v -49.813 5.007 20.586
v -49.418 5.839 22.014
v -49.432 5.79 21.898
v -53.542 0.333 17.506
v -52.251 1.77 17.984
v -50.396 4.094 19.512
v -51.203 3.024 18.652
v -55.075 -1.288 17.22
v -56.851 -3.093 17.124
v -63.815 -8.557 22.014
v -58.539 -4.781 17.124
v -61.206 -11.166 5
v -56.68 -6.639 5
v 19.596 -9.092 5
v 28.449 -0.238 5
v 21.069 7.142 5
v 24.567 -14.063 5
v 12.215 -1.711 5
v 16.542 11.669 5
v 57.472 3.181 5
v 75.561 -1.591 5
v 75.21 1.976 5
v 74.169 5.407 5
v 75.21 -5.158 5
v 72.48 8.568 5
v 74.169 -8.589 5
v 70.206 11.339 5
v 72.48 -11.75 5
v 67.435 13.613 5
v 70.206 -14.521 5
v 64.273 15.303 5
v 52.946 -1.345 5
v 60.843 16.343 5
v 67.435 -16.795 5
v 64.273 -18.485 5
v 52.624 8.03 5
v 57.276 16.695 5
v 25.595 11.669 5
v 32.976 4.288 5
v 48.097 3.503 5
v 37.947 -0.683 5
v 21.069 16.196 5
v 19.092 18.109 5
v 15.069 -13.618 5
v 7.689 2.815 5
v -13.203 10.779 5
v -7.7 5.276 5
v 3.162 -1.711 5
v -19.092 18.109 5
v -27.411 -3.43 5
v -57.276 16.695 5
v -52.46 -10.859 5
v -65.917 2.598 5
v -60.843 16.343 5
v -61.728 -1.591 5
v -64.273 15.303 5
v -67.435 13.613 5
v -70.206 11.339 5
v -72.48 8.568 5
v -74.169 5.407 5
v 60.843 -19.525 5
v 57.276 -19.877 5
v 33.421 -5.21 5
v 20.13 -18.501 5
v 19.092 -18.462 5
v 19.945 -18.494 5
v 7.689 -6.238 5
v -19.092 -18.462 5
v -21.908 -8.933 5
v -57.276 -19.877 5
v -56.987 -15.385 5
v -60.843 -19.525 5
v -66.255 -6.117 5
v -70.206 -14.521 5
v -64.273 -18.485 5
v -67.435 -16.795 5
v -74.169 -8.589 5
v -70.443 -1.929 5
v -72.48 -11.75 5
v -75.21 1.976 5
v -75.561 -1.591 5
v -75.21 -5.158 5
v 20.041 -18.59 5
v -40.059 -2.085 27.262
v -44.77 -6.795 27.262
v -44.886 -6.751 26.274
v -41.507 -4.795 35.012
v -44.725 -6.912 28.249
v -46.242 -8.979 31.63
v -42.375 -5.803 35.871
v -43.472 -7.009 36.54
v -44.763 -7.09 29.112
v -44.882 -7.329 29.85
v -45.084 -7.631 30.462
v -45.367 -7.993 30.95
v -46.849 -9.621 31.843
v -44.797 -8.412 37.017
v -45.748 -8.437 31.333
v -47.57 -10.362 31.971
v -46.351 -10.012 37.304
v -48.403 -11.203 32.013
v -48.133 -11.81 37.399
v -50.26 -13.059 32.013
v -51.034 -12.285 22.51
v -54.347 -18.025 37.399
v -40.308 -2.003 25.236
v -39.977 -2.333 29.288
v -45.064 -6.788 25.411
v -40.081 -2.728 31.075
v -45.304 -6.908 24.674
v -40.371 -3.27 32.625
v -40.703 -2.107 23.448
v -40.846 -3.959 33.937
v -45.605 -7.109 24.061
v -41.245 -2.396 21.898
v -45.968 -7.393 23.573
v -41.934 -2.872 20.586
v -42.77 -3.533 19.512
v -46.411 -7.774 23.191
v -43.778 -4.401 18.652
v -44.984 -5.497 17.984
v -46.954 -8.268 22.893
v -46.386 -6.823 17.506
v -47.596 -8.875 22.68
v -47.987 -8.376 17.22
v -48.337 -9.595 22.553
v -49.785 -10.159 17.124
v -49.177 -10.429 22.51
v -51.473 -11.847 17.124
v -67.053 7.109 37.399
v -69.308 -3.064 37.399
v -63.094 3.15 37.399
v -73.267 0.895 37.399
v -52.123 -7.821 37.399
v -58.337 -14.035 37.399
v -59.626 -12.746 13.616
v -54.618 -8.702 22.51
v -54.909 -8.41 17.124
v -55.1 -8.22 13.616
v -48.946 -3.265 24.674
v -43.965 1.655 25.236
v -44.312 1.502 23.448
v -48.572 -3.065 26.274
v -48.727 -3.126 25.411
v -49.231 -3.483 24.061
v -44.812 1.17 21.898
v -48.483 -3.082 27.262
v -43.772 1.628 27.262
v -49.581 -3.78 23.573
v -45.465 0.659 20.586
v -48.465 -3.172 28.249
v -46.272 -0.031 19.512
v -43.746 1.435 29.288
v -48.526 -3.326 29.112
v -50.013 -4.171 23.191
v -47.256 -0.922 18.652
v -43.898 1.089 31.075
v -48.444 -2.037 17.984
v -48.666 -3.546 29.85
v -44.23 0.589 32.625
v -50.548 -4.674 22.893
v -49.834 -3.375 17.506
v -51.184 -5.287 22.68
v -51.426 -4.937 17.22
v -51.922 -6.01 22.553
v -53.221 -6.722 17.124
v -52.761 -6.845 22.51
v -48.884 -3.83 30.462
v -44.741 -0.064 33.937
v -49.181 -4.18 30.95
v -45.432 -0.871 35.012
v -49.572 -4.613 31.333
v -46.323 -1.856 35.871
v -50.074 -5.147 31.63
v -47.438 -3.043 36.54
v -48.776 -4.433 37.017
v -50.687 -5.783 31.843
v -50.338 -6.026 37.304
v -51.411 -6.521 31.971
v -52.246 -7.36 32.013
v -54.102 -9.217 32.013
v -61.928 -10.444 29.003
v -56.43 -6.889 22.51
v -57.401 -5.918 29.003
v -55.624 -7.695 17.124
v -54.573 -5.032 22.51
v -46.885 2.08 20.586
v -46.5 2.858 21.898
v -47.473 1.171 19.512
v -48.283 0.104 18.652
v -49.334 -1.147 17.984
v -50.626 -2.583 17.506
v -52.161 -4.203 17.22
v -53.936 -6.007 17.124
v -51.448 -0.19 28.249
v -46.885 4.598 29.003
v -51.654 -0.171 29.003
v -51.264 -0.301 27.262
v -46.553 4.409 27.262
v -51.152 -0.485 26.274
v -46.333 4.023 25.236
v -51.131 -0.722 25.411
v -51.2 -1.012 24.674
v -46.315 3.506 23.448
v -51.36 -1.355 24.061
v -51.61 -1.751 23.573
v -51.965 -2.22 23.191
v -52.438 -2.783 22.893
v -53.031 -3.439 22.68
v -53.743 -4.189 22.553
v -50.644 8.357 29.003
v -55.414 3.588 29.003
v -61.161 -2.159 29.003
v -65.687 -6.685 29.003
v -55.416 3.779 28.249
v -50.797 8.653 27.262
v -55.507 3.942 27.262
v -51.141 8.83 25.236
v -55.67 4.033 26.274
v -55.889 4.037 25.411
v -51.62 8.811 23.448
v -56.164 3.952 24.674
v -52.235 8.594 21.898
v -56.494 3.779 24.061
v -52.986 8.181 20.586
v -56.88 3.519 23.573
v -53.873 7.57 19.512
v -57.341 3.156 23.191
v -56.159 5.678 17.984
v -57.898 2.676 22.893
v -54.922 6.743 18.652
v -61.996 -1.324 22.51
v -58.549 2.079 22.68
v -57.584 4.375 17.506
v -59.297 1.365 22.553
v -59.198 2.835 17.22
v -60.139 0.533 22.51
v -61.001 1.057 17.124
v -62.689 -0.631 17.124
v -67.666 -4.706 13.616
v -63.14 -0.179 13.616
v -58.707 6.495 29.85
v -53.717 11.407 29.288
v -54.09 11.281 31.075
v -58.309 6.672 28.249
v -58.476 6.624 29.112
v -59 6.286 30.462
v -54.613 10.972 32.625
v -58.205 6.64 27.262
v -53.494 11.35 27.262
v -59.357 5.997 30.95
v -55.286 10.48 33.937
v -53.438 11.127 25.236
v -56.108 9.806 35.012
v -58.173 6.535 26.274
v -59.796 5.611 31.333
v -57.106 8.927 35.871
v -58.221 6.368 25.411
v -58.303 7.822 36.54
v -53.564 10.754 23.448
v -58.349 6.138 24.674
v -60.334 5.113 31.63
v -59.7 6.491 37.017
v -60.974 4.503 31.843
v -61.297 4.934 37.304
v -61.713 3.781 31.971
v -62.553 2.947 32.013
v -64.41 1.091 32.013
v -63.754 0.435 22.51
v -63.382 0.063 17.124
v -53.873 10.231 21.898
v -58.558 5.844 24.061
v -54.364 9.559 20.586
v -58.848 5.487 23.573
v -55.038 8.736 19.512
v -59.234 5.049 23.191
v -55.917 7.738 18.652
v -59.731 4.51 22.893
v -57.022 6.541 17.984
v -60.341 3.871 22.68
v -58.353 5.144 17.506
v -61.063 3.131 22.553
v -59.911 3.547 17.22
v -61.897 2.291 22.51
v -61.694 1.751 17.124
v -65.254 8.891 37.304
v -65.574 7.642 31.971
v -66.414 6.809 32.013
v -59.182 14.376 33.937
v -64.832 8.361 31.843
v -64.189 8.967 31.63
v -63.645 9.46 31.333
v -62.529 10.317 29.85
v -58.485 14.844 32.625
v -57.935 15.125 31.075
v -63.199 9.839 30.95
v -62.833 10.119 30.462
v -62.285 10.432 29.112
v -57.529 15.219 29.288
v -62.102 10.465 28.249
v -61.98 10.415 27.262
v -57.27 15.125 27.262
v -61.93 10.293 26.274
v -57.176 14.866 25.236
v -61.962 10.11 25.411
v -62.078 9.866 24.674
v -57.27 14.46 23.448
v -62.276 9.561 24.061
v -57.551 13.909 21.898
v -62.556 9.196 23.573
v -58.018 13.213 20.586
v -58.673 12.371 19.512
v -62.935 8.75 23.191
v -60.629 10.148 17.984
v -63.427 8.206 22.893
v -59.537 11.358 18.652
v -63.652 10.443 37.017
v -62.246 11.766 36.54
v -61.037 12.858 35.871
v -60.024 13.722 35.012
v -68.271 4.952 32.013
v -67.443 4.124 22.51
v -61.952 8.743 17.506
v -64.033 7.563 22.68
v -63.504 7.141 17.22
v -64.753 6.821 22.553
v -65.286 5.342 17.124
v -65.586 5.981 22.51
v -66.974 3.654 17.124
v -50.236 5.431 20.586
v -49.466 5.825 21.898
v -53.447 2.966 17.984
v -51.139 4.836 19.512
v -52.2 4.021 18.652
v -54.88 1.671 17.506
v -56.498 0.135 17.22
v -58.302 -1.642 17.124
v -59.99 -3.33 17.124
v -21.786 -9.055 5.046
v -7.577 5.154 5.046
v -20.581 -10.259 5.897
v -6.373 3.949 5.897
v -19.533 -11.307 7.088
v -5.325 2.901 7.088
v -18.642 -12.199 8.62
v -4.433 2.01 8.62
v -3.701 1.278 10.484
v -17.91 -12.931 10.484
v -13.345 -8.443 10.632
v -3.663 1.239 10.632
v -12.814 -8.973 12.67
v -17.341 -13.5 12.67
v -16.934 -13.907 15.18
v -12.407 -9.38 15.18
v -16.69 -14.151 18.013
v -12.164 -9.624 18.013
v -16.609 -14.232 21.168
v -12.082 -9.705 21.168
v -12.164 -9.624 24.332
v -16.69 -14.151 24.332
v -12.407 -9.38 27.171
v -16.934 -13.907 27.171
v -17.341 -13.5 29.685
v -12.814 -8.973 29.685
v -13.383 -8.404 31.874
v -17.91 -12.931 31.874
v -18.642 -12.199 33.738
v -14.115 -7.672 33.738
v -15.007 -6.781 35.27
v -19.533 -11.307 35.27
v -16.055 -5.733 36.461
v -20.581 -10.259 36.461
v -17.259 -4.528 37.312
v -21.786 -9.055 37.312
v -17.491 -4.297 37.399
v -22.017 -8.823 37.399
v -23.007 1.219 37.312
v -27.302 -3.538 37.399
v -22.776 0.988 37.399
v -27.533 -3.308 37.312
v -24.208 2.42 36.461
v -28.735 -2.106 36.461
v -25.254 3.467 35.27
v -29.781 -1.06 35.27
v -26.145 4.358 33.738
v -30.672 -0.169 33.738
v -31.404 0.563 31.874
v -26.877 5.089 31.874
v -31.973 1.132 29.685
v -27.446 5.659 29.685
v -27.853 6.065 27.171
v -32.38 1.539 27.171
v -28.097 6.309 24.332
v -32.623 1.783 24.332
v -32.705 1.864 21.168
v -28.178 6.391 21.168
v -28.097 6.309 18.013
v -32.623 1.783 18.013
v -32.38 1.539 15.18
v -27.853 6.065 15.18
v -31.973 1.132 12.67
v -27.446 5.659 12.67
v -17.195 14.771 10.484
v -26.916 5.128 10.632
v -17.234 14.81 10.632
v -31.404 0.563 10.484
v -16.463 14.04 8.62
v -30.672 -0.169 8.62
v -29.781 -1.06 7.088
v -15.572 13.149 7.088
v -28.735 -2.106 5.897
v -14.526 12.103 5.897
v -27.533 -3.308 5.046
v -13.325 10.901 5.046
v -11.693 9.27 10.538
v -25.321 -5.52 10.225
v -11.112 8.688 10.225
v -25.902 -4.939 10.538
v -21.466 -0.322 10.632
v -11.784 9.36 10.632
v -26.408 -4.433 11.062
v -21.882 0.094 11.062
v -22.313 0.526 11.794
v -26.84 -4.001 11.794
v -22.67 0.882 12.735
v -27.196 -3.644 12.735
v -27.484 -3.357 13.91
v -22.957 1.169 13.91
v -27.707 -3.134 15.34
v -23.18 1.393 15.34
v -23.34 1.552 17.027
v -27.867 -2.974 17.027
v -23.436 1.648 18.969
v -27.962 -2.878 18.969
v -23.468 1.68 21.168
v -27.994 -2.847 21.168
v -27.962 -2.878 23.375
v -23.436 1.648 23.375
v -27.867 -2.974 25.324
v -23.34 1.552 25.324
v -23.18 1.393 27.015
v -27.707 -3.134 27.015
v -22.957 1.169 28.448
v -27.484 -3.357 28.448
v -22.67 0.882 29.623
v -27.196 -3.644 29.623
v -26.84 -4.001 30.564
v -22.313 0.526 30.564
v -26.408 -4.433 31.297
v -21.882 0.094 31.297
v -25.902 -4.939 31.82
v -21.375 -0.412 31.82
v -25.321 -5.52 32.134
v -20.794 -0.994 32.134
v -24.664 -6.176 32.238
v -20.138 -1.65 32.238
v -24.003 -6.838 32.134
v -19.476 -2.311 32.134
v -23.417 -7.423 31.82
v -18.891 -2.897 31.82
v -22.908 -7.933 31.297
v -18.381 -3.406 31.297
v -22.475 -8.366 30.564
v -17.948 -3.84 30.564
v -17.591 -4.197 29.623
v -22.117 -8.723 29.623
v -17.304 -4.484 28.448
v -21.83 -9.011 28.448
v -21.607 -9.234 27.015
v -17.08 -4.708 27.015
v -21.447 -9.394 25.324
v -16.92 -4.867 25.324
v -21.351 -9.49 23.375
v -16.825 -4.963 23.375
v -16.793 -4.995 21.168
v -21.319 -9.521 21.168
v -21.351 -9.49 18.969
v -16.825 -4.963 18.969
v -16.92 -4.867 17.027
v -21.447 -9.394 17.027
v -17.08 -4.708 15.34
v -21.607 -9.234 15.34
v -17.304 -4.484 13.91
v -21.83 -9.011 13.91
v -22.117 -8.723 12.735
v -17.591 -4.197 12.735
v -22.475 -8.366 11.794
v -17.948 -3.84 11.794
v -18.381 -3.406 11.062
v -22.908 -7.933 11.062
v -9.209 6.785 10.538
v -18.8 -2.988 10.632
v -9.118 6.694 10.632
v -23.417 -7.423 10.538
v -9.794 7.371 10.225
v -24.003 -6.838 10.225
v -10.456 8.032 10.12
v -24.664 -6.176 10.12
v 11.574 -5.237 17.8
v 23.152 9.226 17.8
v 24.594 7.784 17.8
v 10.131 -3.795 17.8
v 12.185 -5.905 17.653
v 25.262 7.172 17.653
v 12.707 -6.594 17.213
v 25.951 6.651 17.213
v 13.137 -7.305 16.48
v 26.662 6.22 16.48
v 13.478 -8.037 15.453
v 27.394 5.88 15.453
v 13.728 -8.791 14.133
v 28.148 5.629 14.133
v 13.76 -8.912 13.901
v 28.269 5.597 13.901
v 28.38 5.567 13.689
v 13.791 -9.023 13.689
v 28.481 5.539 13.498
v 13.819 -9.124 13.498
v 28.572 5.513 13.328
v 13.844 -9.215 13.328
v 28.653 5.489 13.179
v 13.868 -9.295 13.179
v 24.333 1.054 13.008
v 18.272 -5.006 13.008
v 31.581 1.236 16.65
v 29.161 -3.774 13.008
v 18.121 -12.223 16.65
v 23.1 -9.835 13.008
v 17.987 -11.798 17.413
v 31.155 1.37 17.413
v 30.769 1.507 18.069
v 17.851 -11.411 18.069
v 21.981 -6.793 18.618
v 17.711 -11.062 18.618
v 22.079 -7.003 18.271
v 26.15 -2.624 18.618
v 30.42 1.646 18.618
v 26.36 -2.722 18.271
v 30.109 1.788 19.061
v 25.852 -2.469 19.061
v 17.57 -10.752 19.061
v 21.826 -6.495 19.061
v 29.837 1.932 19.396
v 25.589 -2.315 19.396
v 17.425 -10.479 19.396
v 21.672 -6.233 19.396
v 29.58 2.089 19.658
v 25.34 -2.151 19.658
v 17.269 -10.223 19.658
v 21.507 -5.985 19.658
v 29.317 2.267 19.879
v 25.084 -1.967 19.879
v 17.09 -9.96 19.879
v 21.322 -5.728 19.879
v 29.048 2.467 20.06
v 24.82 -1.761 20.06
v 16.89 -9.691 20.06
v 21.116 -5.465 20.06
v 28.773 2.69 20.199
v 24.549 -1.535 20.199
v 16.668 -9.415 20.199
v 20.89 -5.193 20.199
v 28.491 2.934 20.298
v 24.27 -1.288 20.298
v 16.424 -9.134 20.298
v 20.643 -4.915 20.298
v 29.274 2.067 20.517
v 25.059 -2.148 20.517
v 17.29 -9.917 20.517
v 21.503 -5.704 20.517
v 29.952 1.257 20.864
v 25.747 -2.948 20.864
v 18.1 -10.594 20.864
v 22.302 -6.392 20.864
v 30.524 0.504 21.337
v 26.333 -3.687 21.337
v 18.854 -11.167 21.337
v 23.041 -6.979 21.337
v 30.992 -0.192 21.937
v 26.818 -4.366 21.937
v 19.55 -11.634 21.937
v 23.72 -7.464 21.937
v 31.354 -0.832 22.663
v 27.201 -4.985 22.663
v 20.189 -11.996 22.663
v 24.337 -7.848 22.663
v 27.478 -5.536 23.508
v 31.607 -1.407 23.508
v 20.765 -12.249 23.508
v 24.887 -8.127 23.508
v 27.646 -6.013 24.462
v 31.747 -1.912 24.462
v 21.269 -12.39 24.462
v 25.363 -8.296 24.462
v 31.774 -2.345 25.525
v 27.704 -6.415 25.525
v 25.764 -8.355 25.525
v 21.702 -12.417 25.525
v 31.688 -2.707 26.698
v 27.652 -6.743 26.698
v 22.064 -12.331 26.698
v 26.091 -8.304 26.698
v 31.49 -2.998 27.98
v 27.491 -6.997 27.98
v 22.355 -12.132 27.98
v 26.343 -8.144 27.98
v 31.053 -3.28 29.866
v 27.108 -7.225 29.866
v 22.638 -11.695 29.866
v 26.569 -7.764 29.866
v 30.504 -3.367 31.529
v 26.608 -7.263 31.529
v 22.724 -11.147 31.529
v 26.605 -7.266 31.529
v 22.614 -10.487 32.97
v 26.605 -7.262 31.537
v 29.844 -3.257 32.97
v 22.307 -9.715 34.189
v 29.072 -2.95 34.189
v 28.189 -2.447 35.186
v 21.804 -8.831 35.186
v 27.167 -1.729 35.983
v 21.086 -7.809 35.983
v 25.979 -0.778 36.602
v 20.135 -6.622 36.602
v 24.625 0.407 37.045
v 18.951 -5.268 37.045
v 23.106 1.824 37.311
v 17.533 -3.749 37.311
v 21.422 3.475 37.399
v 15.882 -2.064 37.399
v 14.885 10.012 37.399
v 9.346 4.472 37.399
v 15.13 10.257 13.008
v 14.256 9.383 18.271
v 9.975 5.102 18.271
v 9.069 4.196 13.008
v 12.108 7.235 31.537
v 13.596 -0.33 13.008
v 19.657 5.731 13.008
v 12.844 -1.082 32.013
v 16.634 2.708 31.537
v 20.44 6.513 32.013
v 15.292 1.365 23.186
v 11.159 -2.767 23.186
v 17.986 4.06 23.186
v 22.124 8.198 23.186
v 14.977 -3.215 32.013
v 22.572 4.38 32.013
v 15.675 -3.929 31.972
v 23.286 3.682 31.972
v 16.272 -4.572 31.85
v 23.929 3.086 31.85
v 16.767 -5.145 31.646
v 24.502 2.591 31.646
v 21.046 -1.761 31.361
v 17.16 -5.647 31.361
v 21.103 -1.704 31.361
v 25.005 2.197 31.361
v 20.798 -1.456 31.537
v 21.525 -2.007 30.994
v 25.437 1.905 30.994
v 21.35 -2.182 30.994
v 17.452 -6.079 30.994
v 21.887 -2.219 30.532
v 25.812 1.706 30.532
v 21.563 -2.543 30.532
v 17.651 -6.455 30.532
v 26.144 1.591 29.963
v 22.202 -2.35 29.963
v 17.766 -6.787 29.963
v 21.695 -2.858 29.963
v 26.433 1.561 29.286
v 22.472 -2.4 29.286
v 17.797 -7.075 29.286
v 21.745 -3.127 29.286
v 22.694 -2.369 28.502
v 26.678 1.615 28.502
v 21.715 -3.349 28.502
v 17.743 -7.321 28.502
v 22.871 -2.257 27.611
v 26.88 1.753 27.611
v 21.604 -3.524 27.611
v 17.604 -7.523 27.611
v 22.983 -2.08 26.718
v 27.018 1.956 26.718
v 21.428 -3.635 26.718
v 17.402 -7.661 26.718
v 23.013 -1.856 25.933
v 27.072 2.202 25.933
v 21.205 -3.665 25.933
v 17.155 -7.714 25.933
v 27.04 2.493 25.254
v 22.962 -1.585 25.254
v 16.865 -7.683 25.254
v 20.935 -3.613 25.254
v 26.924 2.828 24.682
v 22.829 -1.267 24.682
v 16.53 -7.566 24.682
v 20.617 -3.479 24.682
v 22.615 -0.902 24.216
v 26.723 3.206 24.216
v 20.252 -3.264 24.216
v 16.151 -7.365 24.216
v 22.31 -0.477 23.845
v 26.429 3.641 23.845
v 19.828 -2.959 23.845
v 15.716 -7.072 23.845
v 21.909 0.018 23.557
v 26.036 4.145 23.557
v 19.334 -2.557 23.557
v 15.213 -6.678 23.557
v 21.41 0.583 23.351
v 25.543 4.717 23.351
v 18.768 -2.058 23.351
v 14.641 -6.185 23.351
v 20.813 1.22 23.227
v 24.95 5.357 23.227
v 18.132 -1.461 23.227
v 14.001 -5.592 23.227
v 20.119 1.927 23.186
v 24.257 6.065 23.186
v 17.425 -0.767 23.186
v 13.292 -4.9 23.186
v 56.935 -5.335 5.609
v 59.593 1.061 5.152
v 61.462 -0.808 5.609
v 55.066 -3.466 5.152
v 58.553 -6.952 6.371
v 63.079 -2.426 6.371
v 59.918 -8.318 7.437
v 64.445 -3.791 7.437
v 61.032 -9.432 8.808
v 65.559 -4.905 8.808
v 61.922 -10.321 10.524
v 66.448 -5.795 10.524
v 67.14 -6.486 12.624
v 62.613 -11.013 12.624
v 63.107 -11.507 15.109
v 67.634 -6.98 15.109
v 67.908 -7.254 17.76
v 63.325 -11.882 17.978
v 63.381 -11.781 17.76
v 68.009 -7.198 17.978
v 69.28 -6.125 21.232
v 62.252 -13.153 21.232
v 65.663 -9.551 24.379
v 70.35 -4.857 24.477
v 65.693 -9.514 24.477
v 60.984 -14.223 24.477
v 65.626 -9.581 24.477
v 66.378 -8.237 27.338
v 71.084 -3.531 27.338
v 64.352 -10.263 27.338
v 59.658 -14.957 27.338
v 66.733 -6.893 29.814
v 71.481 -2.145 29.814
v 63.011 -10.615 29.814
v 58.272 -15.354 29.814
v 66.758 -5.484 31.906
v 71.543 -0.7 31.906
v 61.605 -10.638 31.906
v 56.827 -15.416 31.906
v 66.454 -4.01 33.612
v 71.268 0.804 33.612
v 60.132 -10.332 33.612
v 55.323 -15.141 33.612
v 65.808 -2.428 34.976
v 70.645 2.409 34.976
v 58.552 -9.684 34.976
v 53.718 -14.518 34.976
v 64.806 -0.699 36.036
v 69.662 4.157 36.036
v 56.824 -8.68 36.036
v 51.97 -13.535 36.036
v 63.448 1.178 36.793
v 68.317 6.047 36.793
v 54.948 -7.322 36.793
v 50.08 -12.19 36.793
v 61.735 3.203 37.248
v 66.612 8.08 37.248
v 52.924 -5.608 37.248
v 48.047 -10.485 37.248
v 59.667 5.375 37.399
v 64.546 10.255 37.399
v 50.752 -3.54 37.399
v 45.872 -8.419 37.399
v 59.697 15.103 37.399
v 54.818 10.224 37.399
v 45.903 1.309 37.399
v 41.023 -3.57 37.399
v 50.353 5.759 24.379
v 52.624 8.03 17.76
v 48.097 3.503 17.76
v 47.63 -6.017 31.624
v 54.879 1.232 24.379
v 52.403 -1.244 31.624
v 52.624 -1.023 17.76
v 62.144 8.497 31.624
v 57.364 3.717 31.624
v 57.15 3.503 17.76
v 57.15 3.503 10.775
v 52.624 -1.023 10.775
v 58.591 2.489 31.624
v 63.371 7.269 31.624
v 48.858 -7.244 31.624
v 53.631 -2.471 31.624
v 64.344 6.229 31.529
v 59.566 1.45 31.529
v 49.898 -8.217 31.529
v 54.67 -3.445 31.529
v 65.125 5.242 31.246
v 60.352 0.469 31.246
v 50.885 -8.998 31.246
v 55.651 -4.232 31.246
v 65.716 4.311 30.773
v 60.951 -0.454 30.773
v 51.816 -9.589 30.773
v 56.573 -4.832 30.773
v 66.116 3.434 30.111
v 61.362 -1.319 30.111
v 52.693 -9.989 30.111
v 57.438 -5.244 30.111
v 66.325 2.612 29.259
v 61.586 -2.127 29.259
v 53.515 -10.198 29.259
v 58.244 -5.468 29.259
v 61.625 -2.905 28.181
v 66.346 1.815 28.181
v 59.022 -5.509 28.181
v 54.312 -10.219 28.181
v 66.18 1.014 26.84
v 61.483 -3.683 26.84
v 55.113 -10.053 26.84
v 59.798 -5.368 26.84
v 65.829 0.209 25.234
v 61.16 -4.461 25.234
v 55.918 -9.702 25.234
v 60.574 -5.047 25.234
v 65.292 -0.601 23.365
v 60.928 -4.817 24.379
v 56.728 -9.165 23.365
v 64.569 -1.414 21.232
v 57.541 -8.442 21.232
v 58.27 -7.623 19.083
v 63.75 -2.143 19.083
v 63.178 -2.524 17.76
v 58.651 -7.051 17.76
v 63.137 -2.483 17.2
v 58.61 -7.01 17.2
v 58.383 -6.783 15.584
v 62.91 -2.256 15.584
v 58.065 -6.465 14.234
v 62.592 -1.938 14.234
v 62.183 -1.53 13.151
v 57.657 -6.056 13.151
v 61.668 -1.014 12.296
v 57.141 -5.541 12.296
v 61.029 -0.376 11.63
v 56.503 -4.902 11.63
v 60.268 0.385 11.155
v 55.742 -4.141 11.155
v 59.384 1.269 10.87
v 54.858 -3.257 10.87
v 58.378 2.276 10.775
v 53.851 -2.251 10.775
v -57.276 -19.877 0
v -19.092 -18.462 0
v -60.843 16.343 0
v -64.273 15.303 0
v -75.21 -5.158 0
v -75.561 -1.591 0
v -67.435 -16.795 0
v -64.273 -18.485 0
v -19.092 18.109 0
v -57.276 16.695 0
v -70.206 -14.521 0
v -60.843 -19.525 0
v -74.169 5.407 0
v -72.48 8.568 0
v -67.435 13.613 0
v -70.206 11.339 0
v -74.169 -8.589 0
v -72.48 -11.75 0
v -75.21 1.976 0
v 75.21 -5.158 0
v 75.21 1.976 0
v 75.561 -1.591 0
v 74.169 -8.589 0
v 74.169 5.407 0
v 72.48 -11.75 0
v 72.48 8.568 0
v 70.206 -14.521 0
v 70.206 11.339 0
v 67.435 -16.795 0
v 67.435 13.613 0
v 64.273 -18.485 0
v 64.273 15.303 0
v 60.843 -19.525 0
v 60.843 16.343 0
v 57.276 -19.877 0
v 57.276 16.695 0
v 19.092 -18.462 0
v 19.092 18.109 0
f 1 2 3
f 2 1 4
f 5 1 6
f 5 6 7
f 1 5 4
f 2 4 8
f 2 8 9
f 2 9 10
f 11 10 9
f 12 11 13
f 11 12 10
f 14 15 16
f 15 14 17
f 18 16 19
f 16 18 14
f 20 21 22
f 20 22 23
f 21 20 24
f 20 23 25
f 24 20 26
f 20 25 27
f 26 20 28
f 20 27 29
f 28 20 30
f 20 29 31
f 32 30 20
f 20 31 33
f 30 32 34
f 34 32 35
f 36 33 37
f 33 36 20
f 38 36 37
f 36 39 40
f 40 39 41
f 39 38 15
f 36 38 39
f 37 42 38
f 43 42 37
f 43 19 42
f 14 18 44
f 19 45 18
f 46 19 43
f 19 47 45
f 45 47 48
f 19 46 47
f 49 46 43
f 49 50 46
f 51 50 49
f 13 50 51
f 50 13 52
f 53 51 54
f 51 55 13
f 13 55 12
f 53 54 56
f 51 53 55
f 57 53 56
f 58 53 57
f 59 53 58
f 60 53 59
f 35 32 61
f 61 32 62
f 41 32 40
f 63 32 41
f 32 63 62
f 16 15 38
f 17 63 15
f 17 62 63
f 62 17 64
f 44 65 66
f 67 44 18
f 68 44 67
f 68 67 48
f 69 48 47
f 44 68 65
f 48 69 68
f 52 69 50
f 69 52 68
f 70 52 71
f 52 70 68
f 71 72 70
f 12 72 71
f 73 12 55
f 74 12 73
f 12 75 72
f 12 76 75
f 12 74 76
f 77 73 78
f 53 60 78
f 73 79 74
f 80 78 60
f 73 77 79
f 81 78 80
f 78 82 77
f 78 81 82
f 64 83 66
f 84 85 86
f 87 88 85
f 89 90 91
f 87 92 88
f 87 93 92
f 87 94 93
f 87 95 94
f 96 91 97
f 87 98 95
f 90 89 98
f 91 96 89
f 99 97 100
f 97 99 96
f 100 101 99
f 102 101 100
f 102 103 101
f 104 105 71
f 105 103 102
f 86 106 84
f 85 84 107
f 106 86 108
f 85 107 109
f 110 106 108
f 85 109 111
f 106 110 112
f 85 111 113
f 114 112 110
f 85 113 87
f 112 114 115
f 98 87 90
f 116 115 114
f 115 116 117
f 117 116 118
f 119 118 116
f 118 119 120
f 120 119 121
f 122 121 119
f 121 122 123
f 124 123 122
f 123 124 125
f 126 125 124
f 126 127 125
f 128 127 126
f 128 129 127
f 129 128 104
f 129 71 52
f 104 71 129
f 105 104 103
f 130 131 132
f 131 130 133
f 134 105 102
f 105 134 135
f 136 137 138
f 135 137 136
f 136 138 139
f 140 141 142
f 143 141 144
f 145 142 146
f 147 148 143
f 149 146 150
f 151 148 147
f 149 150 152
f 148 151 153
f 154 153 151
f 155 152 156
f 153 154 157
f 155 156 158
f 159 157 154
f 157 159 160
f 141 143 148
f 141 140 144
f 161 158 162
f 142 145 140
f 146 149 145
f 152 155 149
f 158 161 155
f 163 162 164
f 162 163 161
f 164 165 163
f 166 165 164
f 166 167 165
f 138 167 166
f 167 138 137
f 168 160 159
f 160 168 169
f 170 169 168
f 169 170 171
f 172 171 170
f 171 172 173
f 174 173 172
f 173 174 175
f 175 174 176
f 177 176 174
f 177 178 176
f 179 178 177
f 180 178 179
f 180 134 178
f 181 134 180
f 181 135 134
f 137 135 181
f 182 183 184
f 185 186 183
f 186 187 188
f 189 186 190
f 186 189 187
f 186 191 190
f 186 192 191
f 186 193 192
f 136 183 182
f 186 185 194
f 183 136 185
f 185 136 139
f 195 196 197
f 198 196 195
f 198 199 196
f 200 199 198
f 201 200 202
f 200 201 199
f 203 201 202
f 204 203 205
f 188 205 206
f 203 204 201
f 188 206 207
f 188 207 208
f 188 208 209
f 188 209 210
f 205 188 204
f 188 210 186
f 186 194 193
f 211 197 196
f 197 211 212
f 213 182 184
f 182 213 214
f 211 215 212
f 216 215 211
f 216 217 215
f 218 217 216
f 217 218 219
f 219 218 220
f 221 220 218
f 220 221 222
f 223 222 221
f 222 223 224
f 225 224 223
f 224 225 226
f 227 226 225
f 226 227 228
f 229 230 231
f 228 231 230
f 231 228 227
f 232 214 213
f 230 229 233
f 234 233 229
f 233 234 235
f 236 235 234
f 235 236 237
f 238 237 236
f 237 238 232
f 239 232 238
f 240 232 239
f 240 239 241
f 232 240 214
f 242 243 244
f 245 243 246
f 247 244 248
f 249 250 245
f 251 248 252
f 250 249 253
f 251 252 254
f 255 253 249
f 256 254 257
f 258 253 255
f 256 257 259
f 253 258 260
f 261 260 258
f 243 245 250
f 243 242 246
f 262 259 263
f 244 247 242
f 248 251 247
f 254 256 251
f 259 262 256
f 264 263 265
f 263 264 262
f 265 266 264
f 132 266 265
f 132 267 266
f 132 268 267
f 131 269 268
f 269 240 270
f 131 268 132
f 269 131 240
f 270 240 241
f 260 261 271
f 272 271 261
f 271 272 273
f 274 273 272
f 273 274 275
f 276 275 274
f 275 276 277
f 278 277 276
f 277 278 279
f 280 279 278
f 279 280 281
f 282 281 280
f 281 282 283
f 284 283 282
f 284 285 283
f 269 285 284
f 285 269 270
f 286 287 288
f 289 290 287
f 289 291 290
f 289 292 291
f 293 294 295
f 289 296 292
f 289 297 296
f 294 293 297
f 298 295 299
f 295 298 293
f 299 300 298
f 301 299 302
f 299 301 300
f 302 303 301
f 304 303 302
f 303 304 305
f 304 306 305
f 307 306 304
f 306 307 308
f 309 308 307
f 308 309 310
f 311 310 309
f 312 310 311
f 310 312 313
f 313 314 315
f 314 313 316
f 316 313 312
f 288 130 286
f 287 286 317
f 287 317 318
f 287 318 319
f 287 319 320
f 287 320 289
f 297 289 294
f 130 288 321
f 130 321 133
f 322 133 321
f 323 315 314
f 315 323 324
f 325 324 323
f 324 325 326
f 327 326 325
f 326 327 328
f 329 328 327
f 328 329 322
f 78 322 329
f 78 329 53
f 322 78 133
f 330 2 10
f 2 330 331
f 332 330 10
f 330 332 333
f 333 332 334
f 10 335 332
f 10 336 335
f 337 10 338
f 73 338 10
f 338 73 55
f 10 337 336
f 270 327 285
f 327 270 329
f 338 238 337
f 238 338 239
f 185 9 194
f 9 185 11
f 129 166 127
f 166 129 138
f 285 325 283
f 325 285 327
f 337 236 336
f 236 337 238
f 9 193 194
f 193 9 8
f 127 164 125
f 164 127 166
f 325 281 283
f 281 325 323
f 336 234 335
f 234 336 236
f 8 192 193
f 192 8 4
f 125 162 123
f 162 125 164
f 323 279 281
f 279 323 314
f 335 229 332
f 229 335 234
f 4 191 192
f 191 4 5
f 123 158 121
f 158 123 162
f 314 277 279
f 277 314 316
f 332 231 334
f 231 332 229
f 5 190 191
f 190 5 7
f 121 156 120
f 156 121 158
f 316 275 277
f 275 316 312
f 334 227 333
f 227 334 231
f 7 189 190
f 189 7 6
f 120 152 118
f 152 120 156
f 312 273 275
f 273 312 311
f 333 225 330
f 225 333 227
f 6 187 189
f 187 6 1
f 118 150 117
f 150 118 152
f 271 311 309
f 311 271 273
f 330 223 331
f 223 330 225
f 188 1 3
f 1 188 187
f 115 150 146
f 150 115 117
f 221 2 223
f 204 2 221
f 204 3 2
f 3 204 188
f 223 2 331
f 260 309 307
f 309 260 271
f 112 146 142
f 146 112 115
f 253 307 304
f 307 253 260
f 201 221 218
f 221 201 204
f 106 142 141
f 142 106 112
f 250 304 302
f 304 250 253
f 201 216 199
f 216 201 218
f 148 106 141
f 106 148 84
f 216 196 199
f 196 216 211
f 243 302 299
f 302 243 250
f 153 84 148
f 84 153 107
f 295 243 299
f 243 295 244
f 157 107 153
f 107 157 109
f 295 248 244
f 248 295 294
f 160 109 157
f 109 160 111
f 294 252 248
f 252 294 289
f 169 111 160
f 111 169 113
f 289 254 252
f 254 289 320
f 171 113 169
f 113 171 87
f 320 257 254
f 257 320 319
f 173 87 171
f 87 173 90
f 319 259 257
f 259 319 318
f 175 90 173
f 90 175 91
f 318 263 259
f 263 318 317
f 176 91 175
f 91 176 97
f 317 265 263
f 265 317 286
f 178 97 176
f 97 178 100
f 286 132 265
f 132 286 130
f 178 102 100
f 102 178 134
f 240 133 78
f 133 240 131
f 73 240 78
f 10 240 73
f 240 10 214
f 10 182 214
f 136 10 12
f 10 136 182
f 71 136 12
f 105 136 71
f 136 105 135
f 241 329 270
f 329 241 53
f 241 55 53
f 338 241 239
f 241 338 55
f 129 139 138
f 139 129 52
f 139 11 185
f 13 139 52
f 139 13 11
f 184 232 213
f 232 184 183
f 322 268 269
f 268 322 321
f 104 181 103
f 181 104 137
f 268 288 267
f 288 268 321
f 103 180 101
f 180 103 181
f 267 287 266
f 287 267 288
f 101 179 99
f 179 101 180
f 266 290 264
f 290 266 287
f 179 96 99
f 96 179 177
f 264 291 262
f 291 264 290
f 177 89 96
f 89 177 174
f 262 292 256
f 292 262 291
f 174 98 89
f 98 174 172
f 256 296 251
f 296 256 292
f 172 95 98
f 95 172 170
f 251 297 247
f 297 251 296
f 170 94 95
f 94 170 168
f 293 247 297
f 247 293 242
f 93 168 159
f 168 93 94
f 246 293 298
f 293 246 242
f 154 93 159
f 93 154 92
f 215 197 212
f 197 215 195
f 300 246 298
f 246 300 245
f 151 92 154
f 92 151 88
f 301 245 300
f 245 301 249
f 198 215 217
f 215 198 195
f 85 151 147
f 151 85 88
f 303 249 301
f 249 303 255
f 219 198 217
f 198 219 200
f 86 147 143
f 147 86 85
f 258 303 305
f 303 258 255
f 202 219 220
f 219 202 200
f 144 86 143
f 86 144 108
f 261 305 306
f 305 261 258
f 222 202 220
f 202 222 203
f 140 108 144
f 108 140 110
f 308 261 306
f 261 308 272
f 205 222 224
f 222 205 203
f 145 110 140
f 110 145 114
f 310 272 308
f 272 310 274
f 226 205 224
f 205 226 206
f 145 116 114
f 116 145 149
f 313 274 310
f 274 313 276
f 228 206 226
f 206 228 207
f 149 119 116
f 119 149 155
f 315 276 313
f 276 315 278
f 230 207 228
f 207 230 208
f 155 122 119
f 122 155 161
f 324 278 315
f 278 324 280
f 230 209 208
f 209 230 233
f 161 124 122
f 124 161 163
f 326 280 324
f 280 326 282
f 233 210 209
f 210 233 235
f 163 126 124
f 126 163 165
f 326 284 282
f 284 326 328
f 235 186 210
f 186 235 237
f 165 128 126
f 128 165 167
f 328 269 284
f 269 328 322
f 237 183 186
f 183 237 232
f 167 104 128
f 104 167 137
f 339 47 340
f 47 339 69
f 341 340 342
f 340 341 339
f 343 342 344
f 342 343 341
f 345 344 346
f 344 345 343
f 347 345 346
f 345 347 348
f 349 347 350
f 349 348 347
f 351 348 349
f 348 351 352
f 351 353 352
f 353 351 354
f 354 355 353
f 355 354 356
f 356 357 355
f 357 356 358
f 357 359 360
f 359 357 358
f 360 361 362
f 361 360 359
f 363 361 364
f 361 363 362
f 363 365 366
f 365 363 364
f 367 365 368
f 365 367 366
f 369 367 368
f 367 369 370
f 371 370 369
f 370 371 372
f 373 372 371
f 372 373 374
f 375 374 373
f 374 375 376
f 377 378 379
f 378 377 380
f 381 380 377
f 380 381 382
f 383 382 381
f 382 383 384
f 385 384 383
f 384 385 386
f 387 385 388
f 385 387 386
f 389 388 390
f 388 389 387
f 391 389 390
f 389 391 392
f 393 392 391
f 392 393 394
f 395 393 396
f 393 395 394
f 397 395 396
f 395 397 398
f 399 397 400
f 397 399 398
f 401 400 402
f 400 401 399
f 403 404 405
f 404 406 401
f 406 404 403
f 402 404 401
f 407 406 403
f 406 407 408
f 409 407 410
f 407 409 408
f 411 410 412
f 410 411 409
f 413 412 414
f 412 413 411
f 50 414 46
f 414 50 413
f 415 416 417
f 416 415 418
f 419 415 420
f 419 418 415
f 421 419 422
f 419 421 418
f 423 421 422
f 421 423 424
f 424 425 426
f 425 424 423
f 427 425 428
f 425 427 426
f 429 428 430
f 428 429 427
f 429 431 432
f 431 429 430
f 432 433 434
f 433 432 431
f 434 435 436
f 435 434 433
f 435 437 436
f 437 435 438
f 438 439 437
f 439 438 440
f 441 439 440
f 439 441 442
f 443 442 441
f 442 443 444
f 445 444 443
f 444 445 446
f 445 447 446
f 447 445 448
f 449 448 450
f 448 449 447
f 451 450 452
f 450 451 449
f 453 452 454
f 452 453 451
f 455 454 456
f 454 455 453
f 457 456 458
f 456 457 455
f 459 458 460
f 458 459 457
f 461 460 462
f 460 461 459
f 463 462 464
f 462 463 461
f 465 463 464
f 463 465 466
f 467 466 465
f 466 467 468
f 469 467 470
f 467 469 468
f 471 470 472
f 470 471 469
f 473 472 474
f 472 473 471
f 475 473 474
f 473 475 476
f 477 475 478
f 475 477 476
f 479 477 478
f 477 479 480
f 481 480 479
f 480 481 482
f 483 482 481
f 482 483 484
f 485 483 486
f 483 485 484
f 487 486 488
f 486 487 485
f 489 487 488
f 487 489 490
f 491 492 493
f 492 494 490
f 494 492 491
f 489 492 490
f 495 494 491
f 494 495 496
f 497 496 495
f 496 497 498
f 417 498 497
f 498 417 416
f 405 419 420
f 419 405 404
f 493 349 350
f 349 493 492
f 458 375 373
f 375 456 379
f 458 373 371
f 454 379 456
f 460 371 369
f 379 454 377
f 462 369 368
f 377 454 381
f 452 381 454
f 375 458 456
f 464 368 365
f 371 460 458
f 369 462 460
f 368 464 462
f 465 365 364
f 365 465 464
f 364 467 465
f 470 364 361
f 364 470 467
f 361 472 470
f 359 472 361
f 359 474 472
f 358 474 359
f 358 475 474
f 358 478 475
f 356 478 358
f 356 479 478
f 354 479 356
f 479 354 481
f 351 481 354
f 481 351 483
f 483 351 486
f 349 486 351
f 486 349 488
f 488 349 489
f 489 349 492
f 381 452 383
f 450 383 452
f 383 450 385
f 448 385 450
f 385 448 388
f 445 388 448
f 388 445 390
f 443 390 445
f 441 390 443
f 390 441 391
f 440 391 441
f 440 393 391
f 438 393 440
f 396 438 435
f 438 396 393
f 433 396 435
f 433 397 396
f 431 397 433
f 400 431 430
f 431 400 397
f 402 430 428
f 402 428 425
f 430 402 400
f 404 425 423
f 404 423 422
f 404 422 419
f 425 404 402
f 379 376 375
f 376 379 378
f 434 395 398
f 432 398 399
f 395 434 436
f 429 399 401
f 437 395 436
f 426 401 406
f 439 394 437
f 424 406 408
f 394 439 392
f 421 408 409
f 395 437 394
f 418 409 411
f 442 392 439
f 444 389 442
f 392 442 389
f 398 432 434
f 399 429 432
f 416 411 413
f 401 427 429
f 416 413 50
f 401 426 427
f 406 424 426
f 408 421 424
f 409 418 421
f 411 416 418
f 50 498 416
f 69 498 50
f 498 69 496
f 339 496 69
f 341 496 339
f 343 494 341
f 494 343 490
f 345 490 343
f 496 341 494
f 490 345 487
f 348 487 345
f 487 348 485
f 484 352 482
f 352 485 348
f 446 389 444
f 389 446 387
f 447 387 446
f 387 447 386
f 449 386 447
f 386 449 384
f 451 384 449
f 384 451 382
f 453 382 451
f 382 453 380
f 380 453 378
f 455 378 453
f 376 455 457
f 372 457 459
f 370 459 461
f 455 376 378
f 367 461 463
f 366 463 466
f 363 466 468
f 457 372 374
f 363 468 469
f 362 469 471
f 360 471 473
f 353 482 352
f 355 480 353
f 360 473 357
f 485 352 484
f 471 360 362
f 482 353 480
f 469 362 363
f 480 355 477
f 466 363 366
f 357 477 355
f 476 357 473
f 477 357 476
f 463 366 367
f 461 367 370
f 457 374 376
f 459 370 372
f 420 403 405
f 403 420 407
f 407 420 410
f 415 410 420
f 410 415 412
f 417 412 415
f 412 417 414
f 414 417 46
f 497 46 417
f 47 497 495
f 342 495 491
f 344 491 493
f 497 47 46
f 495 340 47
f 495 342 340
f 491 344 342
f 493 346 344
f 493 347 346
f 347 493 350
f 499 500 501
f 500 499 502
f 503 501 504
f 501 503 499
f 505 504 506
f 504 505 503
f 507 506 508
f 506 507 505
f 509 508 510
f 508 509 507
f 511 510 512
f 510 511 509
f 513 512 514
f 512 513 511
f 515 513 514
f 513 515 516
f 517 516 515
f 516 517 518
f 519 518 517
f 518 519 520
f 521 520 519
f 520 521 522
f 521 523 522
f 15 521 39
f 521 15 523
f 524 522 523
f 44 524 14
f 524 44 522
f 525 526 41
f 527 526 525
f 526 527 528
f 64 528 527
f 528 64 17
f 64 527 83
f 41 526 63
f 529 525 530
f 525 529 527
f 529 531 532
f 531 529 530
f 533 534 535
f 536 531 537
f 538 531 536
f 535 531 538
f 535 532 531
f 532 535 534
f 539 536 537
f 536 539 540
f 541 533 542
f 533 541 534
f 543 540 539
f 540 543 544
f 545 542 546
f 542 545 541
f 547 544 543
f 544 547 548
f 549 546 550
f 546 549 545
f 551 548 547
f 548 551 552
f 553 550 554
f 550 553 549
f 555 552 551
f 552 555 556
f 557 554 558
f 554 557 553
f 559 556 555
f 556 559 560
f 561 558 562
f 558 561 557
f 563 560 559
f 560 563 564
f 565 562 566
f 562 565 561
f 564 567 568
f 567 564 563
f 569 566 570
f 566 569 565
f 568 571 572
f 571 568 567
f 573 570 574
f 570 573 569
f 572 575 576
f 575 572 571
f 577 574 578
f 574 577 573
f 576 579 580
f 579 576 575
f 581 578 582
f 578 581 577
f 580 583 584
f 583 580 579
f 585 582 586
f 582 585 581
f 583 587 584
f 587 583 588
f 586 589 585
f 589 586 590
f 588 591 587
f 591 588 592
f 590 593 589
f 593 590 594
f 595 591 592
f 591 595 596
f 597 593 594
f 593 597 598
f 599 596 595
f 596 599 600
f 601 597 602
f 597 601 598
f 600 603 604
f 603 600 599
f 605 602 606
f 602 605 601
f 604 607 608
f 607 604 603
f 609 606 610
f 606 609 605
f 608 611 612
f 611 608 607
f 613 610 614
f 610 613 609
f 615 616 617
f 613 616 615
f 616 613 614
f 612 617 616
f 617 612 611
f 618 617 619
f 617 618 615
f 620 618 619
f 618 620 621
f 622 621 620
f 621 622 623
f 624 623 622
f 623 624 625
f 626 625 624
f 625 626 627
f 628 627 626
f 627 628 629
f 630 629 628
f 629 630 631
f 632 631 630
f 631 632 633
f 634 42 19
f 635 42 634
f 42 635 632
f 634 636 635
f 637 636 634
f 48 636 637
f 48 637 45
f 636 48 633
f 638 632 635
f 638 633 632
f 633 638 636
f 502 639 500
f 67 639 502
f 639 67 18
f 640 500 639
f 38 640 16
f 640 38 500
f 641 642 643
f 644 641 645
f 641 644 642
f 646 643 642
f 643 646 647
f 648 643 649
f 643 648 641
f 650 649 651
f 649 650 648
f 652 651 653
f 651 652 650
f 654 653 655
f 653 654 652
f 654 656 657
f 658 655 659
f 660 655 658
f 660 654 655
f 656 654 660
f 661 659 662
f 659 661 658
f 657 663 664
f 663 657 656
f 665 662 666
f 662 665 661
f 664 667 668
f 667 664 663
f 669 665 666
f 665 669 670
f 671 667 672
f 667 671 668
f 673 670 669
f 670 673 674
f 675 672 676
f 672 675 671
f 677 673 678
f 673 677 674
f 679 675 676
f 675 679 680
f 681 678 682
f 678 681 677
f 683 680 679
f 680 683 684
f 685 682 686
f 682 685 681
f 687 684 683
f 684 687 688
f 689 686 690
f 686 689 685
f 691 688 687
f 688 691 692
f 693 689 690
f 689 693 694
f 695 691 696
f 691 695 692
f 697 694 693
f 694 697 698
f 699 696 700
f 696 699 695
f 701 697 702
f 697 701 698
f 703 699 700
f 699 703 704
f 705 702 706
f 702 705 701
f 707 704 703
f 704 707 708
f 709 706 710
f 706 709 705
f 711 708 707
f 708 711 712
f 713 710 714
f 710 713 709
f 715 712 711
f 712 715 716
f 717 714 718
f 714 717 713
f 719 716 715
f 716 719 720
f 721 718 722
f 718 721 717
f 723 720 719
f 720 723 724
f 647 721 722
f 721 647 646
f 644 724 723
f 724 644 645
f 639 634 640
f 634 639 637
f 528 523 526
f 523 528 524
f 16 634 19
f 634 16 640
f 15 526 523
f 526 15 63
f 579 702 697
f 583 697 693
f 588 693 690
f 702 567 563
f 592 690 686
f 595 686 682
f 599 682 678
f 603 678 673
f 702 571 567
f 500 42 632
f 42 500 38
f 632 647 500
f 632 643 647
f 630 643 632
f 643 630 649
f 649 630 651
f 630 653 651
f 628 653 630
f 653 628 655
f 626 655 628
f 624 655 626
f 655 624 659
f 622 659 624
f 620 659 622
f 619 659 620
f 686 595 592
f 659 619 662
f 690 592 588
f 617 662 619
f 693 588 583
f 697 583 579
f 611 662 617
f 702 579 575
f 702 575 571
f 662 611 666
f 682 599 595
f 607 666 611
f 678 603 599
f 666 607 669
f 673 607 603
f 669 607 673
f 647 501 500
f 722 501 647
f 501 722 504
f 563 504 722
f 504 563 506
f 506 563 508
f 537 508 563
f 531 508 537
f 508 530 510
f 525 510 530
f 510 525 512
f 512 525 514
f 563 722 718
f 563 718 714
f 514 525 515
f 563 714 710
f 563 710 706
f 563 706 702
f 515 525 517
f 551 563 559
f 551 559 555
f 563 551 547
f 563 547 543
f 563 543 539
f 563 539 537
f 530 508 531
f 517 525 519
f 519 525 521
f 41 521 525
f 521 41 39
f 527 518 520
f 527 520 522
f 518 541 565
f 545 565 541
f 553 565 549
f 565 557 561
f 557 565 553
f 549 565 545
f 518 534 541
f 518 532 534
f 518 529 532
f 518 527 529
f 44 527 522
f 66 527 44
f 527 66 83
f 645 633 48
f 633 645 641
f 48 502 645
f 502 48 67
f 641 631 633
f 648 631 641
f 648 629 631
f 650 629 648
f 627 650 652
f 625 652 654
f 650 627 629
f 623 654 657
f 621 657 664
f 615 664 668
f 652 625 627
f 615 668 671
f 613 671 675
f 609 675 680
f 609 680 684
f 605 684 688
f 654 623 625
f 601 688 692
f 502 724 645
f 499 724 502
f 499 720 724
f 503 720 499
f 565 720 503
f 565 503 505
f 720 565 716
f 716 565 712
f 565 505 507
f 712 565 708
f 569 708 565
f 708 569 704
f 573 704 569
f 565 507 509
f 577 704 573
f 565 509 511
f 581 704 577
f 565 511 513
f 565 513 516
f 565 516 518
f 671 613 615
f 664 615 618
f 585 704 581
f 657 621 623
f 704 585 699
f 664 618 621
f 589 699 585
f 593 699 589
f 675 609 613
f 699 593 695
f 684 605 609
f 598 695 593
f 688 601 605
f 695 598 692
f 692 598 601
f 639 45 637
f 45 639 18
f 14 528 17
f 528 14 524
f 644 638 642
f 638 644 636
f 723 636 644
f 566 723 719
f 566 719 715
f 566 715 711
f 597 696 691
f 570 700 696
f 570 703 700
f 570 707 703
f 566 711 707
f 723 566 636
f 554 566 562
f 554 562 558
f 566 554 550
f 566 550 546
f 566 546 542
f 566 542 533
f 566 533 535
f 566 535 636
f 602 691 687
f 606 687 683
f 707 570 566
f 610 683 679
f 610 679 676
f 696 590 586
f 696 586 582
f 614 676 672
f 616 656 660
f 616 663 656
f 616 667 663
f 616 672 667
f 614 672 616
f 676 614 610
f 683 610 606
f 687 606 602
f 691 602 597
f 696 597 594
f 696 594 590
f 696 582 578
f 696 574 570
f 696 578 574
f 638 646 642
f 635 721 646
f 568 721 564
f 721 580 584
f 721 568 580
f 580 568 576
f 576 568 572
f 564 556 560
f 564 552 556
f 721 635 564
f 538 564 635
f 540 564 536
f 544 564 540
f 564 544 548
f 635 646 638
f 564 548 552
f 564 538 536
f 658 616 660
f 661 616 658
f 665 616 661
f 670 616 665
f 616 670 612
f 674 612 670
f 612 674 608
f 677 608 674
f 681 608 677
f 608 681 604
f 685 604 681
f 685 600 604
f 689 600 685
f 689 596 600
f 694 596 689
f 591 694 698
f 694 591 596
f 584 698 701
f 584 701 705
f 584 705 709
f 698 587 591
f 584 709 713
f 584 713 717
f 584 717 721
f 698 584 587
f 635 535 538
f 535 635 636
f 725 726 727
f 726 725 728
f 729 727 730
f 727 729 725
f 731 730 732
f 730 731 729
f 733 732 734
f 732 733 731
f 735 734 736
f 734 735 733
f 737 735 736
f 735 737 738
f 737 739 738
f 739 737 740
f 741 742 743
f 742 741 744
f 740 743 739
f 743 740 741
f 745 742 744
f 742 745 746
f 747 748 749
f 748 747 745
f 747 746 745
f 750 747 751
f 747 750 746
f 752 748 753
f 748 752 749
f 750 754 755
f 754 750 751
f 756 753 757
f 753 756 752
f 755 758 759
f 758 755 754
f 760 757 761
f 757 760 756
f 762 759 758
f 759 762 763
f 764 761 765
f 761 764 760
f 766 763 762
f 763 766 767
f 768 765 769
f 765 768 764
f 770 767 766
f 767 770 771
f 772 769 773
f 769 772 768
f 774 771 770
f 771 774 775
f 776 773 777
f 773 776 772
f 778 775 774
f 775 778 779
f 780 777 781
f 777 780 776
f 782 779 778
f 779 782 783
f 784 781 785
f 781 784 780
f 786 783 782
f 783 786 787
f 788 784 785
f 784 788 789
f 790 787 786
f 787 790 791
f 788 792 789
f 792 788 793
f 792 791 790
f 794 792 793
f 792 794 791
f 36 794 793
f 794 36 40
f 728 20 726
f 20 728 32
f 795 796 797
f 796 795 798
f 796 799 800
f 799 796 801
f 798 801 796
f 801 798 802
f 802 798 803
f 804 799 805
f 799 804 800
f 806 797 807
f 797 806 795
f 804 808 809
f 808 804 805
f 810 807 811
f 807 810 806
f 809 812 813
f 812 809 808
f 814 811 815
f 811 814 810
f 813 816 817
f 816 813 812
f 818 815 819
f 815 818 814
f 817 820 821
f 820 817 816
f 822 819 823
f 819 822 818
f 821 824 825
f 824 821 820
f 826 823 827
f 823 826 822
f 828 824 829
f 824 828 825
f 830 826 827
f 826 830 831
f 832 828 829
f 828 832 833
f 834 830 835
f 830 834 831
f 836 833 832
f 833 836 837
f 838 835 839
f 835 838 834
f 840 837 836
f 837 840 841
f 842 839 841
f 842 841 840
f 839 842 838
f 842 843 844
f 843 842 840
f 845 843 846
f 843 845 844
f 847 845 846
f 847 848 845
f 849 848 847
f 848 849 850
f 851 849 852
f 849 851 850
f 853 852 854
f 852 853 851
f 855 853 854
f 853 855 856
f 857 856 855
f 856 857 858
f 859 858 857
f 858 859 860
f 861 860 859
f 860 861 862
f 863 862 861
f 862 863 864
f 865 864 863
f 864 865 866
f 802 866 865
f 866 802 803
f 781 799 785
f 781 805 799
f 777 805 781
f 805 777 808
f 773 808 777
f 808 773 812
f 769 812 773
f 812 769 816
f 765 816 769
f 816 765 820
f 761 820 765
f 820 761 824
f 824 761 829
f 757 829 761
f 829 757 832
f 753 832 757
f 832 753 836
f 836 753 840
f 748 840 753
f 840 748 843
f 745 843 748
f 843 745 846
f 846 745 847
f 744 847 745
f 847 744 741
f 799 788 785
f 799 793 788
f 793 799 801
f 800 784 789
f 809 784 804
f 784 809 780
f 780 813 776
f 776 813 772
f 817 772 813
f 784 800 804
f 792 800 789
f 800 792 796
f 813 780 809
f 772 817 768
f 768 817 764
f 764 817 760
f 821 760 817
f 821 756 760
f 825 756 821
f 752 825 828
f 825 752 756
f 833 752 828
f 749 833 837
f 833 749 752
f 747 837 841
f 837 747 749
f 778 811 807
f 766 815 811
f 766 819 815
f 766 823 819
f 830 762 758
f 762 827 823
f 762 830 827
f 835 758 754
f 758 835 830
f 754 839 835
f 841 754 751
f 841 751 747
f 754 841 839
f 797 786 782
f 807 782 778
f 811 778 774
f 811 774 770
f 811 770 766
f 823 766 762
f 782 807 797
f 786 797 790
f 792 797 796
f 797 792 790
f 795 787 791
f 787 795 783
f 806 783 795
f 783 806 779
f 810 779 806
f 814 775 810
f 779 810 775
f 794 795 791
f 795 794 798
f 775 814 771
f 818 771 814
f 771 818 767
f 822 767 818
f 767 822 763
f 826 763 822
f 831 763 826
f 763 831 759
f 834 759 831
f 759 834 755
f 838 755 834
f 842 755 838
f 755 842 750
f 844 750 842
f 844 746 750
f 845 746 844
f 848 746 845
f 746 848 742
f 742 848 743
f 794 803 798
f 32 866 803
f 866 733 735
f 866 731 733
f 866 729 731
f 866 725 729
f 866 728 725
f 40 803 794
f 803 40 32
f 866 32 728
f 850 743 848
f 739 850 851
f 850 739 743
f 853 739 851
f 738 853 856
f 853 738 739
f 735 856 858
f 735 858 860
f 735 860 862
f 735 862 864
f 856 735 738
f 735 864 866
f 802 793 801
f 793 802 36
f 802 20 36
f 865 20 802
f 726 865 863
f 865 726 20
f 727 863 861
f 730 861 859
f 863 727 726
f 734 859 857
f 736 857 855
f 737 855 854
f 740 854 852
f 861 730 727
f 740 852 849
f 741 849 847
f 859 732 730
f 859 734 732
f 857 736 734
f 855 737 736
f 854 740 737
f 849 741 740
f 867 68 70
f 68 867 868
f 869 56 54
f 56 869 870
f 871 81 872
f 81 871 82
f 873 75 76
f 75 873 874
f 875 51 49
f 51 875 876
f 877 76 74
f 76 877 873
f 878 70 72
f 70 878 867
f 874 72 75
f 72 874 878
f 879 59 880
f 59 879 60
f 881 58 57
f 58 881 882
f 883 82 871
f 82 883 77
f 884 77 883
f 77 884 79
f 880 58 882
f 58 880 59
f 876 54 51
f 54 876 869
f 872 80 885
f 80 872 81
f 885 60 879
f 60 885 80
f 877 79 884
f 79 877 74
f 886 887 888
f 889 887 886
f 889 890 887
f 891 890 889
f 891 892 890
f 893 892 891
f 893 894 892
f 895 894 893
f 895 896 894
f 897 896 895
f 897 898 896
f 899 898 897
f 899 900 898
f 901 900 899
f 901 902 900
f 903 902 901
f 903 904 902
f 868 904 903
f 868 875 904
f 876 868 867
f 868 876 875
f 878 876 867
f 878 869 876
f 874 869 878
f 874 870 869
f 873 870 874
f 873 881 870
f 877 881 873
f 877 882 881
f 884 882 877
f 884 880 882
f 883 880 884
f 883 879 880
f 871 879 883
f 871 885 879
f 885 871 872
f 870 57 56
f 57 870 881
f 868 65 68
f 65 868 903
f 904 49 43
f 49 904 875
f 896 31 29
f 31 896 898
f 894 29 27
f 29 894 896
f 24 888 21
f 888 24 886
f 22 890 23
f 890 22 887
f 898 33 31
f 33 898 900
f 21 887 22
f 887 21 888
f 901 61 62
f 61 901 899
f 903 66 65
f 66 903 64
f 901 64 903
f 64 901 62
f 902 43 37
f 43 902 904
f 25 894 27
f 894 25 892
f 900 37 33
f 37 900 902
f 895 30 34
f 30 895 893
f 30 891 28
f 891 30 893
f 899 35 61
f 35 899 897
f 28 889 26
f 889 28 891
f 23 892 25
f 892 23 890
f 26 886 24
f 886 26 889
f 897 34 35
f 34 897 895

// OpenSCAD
// quick tips:
// 1. stick to capital letters
// 2. ? and ! and anything else with a dot is right out
// 3. you can always change the font if you find a better one

// Increase when using openSCAD; decrease if customizer starts timing out.
rounding=32; // [5:256]

font_size = 32;

// first word
word1 = "WORD";

// second word
word2 = "PLAY";

// how much extra spacing is between letters. may have to adjust depending on font size
extra_word_spacing = -5;

// how offset the second word is from the first
rotation=90; // [45:135]

// how much further the letters extrude before they are intersected. you will need to lengthen this if you change the rotation
extra_extrusion_length = 0; // [100]

// how much the base curves. set to 0 for no curve
curvature_factor = 0.5; // [0:0.05:3]

// how thick the base under the words is
base_thickness = 5;

font="DejaVu Sans Mono:style=Bold";

// the words need to be equal in length to work
/* assert(len(word1) == len(word2)); */

// derived variables
length = max(len(word1), len(word2));
word_spacing = font_size + extra_word_spacing;
extrusion_length = font_size + extra_extrusion_length;

half_spacing = word_spacing*(length-1)/2;

// you can change the empty string to a UTF8 full block, but Thingiverse Customizer can't handle it
function letterText(word, index) = (index >=len(word) || word[index] == " ") ? "" : word[index];

// finds the position of the letter based off the index
module letter_position(i, cf = curvature_factor) {
  current_letter_delta = word_spacing * i;

  function curvature(i, length, factor) = pow((i-(length-1)/2),2) * factor;

  translate([current_letter_delta,base_thickness,-current_letter_delta]){
    translate([curvature(i, length, cf), 0, curvature(i, length, cf)]) {
      children();
    }
  }
}

module words() {
  for (i = [0:length-1]) {
    // the whole thing is done on its side, so this rotates it to a normal position
    rotate([90,0,0]) {
      letter_position(i) {
        letter1 = letterText(word1, i);
        letter2 = letterText(word2, i);
        // for debugging you can change this to union()
        intersection() {
          if (letter1 != ""){
            linear_extrude(extrusion_length, center=true) {
              text(letter1, font=font, halign="center", size=font_size, $fn=rounding);
            }
          }

          // rotates one word to oppose the other
          if(letter2 != ""){
            rotate([0,rotation,0]) {
              linear_extrude(extrusion_length, center=true) {
                text(letter2, font=font, halign="center", size=font_size, $fn=rounding);
              }
            }
          }
        }
      }
    }
  }
}

// straight bar, doesn't work with curvature, doesn't scale currently
module base1() {
  rotate(-45) linear_extrude(height=2) offset(r=2, $fn=24) square([7.5,10*(length)], center=true);
}

// hull of the projections of the letters.
module base2() {
  linear_extrude(2) offset(2, $fn=24) hull() projection() words();
}

// successive hull (in slices of 2) of cylinders underneath the letters
module base3() {
  rotate([90,0,0]) {
    for (i = [0:length-2]) {
      hull() {
        // no idea why 1.75
        letter_position(i) rotate([90,0,0]) cylinder(r=extrusion_length/1.75, h=base_thickness, $fn=rounding);
        letter_position(i+1) rotate([90,0,0]) cylinder(r=extrusion_length/1.75, h=base_thickness, $fn=rounding);
      }
    }
  }
}

rotate(-45) translate([-half_spacing,-half_spacing,0]) {
  words();
  base3();
}
